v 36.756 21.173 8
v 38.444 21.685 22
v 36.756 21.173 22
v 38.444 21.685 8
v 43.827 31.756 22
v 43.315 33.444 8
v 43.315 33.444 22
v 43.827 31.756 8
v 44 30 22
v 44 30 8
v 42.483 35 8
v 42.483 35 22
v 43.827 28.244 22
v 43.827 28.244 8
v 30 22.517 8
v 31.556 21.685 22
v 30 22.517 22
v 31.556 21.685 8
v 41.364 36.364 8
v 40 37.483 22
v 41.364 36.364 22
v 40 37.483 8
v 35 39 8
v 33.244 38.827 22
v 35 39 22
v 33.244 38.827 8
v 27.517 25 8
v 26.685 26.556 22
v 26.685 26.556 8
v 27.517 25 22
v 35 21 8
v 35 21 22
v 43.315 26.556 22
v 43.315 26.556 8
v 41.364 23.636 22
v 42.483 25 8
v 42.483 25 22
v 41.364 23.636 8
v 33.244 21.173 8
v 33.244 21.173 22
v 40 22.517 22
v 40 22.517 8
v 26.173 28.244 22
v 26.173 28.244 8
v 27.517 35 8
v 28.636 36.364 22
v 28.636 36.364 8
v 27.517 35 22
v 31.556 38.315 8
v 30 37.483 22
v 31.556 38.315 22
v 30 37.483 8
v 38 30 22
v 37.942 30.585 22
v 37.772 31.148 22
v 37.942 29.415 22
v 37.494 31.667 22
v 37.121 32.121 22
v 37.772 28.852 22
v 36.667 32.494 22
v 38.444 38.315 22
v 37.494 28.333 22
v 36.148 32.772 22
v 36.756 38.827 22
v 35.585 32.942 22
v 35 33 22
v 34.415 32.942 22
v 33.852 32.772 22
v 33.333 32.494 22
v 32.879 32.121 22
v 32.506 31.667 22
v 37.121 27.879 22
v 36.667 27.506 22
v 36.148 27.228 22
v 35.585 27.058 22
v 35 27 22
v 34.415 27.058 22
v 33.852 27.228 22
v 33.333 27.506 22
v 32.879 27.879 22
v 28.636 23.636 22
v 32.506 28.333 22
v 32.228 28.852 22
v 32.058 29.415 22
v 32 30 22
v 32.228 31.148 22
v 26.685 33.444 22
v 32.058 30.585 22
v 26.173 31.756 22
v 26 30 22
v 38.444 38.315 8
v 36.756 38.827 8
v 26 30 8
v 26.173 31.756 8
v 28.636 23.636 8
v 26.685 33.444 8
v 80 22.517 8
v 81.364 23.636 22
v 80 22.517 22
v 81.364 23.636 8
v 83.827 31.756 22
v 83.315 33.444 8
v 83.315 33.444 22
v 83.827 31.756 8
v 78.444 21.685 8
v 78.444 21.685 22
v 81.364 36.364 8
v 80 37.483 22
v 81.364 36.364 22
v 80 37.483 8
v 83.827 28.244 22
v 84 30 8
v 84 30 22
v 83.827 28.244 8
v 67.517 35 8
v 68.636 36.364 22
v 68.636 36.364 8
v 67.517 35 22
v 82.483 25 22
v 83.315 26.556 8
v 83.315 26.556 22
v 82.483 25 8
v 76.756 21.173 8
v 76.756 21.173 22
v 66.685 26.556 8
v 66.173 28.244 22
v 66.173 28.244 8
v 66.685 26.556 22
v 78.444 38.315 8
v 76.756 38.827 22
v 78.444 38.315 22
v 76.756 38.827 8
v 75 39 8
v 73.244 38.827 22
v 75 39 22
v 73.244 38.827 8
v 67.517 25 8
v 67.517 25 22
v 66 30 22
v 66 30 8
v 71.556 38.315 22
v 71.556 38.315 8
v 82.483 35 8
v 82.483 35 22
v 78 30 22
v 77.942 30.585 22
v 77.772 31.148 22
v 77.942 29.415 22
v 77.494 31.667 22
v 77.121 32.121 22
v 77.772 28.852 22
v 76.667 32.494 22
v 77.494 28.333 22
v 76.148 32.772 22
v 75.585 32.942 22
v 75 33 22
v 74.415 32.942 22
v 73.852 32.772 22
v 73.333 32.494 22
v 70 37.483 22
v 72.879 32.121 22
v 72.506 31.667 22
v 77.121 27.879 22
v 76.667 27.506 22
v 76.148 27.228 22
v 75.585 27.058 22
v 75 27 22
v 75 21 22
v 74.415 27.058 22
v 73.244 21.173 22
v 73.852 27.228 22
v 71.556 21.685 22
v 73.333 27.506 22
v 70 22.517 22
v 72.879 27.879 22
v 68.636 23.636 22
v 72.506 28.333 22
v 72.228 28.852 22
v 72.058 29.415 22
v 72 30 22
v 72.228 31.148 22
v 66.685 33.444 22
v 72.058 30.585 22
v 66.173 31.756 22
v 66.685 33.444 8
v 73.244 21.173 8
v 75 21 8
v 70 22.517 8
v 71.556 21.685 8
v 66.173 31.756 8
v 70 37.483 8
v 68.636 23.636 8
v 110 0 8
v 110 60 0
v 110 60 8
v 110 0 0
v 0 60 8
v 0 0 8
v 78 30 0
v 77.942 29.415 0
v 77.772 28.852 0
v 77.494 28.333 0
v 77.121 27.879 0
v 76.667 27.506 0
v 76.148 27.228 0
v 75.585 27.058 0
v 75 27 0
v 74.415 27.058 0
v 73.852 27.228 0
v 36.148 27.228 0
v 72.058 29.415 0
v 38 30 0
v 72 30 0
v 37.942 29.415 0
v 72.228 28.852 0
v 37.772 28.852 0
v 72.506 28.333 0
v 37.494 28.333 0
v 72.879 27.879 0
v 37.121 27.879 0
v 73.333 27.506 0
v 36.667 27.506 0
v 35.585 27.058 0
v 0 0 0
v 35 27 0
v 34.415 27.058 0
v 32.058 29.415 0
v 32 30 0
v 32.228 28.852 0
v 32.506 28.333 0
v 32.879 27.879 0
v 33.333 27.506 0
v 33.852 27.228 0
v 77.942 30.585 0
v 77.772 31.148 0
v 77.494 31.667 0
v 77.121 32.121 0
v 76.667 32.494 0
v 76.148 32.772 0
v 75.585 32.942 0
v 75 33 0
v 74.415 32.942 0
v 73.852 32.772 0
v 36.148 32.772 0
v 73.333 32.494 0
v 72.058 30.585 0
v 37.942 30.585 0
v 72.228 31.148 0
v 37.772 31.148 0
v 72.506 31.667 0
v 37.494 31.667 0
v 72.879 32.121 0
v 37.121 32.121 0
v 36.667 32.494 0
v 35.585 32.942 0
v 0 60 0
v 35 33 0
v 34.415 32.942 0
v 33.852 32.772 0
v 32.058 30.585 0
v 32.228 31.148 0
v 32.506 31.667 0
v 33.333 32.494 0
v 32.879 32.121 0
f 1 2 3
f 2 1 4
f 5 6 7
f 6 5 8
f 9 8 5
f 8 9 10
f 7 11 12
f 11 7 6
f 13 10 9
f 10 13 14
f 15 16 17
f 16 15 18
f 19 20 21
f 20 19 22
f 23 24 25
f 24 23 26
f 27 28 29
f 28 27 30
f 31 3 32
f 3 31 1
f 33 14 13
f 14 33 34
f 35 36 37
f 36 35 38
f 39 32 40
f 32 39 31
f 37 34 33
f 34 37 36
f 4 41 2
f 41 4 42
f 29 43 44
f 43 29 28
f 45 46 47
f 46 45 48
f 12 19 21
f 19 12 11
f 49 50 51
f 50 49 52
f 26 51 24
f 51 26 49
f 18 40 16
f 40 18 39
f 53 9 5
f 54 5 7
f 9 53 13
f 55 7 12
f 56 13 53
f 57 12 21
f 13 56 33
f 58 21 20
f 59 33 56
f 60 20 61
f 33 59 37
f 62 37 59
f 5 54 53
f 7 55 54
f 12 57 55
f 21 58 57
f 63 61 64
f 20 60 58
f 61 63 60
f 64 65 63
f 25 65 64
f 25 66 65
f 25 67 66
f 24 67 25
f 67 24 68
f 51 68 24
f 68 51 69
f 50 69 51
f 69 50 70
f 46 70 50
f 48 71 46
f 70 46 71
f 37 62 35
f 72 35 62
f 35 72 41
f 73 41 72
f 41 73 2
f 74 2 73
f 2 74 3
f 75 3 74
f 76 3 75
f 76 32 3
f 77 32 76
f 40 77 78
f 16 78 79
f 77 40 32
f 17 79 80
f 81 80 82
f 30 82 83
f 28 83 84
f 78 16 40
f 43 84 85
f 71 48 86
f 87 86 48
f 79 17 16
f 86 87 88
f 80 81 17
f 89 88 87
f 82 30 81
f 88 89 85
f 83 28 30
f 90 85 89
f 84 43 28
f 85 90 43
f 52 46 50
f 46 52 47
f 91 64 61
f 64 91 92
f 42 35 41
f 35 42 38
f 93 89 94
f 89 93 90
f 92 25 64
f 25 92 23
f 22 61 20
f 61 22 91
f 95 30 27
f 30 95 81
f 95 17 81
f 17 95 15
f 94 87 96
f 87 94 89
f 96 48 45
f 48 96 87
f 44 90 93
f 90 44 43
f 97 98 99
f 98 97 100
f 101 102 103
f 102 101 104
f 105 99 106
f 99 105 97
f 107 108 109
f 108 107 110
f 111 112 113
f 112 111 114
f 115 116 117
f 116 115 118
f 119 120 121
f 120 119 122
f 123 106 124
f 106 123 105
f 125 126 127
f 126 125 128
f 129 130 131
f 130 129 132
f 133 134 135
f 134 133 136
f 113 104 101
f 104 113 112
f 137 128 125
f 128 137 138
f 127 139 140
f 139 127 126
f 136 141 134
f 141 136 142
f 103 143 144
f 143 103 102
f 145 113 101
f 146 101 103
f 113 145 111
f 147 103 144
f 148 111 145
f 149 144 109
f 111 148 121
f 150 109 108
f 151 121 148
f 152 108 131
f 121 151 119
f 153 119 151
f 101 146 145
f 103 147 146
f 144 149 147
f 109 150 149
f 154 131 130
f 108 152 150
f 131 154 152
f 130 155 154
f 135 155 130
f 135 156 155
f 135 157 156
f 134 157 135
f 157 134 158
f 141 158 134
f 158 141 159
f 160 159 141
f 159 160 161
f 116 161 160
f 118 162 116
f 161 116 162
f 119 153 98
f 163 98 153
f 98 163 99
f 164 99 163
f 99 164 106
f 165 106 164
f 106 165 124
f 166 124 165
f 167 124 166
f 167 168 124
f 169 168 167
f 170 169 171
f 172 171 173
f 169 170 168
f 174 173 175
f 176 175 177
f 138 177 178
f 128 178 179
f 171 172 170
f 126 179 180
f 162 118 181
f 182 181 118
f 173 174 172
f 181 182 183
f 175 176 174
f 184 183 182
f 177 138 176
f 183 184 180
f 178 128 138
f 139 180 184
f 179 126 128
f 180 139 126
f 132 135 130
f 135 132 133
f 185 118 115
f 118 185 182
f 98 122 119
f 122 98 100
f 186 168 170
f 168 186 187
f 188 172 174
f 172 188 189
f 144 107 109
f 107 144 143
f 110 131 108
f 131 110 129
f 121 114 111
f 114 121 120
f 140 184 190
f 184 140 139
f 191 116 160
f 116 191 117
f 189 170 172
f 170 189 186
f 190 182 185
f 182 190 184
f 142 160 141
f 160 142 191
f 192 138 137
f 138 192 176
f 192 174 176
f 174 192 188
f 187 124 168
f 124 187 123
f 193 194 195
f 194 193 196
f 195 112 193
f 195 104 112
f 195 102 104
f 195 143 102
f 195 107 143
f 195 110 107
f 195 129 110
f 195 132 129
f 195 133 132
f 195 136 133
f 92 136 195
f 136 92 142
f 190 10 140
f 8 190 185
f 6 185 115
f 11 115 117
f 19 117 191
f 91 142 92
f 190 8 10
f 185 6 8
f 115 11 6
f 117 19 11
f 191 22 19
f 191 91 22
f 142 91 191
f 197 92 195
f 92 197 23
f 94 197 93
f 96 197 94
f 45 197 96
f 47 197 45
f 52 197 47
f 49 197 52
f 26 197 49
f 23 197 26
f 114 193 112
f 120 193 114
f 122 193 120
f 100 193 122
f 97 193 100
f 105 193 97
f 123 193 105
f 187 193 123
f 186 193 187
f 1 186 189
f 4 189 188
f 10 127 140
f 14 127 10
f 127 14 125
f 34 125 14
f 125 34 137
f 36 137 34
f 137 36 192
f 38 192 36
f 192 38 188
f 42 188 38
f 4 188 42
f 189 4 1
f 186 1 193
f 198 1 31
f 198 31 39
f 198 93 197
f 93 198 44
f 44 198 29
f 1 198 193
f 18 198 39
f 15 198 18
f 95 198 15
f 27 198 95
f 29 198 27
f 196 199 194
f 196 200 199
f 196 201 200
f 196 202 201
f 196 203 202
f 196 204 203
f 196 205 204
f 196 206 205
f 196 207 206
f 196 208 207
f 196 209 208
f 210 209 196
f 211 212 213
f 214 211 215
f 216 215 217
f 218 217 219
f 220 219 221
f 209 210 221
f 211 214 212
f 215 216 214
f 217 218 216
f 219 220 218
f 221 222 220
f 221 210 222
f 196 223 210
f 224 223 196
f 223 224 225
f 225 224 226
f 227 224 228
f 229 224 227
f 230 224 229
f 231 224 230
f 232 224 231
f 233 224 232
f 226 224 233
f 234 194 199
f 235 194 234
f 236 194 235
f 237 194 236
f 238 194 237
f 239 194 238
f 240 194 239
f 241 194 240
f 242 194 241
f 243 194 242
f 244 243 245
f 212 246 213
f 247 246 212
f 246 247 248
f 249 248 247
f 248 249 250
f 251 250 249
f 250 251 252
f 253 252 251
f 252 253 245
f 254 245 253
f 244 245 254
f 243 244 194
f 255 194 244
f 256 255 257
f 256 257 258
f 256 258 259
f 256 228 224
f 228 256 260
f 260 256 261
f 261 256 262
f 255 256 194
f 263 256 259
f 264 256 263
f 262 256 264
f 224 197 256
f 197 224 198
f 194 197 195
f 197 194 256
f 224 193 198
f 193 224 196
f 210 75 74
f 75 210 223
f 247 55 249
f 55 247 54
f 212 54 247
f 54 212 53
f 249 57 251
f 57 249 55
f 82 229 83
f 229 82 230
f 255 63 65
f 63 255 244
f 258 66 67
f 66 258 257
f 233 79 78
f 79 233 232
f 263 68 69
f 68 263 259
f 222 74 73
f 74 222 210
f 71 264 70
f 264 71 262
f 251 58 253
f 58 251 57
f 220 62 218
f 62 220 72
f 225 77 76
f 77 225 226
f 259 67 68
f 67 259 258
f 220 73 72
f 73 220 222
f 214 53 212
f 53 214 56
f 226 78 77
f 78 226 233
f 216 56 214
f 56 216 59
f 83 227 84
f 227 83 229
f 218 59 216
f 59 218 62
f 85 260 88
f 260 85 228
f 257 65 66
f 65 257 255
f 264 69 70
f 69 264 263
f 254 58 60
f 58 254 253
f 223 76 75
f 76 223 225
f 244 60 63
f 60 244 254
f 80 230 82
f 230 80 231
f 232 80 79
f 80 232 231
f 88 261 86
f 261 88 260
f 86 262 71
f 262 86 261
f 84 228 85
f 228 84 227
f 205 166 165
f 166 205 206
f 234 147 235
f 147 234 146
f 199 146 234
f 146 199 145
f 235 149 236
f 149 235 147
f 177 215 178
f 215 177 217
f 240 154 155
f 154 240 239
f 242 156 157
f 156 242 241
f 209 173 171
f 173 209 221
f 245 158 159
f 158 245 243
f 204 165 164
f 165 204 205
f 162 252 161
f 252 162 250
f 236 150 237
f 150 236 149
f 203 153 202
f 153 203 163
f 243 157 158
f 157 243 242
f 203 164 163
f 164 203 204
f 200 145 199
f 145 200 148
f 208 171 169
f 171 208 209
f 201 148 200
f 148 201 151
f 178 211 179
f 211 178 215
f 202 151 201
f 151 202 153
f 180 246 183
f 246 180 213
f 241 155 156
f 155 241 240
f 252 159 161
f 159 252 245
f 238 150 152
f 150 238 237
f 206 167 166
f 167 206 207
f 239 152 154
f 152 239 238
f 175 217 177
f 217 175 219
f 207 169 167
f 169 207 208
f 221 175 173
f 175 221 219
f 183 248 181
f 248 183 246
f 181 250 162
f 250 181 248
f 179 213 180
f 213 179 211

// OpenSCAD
$fn = 32;

// ----------------------------------------------------------------------
// Drill jig: two_boss jig
// ----------------------------------------------------------------------

// --- parameters (mm) ---
plate_l = 110;            // plate length, X
plate_w = 60;             // plate width, Y
plate_t = 8;              // plate thickness
boss_d = 18;              // guide boss diameter
boss_h = 15;              // boss height above the plate
guide_d = 6;              // guide hole diameter
boss_pitch = 40;          // boss pitch

n_boss = 2;  // guide bosses
boss_x0 = (plate_l - (n_boss - 1) * boss_pitch) / 2;  // first boss X
boss_top = plate_t - 1 + boss_h;  // boss crown height
total_h = boss_top;  // overall height

difference() {
  union() {
  cube([plate_l, plate_w, plate_t]);
  for (i = [0 : n_boss - 1])
    translate([boss_x0 + i * boss_pitch, plate_w / 2, plate_t - 1])
      cylinder(h = boss_h, d = boss_d);
  }
  for (i = [0 : n_boss - 1])
    translate([boss_x0 + i * boss_pitch, plate_w / 2, -1])
      cylinder(h = plate_t + boss_h, d = guide_d);
}
